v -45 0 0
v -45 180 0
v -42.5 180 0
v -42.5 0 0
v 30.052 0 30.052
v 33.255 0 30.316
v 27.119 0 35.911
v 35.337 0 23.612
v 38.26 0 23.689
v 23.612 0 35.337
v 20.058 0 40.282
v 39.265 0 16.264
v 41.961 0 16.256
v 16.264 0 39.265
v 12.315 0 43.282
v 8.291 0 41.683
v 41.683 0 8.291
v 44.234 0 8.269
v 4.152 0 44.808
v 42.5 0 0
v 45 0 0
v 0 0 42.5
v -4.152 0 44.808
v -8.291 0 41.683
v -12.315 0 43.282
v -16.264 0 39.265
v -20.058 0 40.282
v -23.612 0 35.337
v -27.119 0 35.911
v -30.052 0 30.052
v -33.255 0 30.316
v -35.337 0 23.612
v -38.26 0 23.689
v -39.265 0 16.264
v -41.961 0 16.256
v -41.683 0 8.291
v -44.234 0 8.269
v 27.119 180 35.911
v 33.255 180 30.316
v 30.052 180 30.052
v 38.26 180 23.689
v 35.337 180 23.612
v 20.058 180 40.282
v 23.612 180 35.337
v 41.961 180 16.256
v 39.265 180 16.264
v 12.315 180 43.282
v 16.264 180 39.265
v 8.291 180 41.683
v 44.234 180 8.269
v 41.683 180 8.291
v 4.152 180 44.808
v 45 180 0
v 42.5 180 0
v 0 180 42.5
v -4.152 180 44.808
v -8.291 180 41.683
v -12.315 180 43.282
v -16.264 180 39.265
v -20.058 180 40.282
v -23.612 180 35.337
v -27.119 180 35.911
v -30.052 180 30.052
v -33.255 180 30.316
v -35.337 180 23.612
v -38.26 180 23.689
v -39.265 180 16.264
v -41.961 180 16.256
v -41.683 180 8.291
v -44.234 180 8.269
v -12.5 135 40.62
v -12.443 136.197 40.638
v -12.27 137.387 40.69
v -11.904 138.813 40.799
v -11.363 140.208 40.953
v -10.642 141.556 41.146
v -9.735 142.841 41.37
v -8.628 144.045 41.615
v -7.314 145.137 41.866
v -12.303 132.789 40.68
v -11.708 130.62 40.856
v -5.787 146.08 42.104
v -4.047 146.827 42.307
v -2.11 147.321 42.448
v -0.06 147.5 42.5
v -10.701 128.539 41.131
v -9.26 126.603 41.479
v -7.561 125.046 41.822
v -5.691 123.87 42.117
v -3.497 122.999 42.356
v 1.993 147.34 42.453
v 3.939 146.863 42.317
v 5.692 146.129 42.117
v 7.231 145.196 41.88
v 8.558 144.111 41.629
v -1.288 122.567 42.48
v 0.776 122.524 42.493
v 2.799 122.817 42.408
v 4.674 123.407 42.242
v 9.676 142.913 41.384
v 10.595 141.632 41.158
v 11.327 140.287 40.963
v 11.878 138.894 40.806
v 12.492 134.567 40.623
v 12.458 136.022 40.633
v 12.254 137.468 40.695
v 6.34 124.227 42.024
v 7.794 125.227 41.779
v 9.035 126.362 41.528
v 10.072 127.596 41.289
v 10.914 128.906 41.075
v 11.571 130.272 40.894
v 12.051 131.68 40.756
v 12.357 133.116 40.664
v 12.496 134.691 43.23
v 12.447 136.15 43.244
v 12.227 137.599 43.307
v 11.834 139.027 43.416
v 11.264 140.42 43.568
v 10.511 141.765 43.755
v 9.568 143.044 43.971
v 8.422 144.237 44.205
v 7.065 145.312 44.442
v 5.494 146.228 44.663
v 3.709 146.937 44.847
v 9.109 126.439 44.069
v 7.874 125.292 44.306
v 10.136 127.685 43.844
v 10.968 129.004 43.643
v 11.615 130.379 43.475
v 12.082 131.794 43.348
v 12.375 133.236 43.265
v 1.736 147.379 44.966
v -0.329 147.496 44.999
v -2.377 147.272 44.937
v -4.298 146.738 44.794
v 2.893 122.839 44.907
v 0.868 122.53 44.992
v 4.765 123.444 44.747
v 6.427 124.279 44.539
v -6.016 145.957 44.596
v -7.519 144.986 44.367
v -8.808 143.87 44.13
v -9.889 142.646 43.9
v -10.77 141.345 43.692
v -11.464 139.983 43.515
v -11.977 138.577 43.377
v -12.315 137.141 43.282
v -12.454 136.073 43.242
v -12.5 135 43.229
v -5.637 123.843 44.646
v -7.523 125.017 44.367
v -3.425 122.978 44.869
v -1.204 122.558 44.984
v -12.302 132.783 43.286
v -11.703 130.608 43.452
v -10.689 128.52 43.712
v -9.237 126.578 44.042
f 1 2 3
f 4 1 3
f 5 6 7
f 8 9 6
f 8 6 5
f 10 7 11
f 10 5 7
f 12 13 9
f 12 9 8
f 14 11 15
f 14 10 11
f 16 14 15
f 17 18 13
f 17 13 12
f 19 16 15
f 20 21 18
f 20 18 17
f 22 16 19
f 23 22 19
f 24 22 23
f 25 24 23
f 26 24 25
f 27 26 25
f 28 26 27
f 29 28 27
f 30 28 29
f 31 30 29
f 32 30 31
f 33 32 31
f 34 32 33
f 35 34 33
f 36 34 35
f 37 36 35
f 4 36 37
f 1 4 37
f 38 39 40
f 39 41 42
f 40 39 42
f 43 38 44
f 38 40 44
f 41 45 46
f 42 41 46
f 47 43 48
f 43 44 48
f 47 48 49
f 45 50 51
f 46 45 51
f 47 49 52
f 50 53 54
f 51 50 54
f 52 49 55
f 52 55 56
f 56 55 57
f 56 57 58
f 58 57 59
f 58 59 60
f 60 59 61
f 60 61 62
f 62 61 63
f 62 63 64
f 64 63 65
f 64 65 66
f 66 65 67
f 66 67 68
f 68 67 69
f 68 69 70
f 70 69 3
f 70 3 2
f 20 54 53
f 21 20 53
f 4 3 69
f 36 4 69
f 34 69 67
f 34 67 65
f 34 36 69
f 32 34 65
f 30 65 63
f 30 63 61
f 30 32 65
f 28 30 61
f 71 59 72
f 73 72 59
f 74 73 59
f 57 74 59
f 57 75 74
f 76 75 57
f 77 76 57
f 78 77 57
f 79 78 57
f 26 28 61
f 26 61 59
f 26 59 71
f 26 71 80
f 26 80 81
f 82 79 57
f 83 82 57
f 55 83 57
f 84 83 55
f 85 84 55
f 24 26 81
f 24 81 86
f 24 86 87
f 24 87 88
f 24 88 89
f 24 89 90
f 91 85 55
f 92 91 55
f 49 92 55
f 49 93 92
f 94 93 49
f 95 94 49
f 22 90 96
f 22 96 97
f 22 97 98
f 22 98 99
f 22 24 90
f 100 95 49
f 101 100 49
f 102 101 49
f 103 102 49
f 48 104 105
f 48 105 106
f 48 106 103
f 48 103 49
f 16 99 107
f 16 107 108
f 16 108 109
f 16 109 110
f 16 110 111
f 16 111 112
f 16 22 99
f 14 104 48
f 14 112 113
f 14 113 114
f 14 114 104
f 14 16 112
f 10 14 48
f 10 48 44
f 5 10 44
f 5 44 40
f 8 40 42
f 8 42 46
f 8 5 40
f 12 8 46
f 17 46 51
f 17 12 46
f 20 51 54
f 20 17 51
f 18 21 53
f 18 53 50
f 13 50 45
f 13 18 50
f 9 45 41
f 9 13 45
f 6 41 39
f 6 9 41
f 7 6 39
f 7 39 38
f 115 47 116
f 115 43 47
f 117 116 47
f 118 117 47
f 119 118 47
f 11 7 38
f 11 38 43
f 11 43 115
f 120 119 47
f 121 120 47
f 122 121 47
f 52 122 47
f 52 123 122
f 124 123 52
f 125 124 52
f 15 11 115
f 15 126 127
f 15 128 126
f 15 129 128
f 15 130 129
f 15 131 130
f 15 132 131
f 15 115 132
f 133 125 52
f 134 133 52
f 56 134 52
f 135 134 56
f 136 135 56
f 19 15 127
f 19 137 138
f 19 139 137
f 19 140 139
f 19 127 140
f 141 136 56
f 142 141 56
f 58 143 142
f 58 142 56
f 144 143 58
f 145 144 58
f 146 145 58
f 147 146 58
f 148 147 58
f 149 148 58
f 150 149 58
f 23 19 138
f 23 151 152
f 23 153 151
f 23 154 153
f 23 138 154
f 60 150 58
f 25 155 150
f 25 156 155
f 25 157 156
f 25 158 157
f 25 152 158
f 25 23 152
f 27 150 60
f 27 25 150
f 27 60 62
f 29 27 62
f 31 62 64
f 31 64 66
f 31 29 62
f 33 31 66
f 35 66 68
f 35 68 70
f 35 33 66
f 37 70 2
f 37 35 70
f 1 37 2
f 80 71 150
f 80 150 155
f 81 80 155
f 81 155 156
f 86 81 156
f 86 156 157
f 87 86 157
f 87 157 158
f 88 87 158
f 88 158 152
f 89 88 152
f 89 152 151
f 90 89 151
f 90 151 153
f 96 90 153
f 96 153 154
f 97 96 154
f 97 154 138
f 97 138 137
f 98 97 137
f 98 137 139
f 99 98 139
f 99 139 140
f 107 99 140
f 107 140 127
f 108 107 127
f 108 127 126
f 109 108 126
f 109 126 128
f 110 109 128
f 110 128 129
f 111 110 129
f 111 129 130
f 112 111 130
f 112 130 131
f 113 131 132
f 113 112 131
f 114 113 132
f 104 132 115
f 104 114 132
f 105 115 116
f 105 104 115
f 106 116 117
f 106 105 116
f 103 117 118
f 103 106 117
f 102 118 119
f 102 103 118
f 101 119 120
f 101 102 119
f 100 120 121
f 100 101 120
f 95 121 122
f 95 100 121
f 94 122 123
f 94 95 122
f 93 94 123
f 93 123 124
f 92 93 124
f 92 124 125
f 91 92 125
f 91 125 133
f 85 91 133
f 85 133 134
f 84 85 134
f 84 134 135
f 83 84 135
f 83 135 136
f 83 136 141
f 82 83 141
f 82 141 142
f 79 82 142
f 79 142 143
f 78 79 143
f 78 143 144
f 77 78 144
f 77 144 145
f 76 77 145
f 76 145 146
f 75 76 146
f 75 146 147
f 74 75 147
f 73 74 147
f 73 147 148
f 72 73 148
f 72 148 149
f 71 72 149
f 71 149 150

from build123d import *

# Parameters (mm, degrees)
BOSS_EXTRUDE1_DEPTH = 180
SKETCH2_R           = 12.5
CUT_EXTRUDE1_DEPTH  = 191.91883092


with BuildPart() as part:
    # Sketch1 → Boss-Extrude1 (new body)
    with BuildSketch(Plane(origin=(0, 0, 0), x_dir=(1, 0, 0), z_dir=(0, 1, 0))):
        with BuildLine():
            Line((-45, 0), (-42.5, 0))
            ThreePointArc((-42.5, 0), (0, -42.5), (42.5, 0))
            Line((42.5, 0), (45, 0))
            ThreePointArc((45, 0), (0, -45), (-45, 0))
        make_face()
    extrude(amount=BOSS_EXTRUDE1_DEPTH)

    # Sketch2 → Cut-Extrude1 (cut, through all)
    with BuildSketch(Plane.XY):
        with Locations(Location((0, 135, 0), (0, 0, 180))):
            Circle(SKETCH2_R)
    extrude(amount=CUT_EXTRUDE1_DEPTH, mode=Mode.SUBTRACT)


solid = part.part
